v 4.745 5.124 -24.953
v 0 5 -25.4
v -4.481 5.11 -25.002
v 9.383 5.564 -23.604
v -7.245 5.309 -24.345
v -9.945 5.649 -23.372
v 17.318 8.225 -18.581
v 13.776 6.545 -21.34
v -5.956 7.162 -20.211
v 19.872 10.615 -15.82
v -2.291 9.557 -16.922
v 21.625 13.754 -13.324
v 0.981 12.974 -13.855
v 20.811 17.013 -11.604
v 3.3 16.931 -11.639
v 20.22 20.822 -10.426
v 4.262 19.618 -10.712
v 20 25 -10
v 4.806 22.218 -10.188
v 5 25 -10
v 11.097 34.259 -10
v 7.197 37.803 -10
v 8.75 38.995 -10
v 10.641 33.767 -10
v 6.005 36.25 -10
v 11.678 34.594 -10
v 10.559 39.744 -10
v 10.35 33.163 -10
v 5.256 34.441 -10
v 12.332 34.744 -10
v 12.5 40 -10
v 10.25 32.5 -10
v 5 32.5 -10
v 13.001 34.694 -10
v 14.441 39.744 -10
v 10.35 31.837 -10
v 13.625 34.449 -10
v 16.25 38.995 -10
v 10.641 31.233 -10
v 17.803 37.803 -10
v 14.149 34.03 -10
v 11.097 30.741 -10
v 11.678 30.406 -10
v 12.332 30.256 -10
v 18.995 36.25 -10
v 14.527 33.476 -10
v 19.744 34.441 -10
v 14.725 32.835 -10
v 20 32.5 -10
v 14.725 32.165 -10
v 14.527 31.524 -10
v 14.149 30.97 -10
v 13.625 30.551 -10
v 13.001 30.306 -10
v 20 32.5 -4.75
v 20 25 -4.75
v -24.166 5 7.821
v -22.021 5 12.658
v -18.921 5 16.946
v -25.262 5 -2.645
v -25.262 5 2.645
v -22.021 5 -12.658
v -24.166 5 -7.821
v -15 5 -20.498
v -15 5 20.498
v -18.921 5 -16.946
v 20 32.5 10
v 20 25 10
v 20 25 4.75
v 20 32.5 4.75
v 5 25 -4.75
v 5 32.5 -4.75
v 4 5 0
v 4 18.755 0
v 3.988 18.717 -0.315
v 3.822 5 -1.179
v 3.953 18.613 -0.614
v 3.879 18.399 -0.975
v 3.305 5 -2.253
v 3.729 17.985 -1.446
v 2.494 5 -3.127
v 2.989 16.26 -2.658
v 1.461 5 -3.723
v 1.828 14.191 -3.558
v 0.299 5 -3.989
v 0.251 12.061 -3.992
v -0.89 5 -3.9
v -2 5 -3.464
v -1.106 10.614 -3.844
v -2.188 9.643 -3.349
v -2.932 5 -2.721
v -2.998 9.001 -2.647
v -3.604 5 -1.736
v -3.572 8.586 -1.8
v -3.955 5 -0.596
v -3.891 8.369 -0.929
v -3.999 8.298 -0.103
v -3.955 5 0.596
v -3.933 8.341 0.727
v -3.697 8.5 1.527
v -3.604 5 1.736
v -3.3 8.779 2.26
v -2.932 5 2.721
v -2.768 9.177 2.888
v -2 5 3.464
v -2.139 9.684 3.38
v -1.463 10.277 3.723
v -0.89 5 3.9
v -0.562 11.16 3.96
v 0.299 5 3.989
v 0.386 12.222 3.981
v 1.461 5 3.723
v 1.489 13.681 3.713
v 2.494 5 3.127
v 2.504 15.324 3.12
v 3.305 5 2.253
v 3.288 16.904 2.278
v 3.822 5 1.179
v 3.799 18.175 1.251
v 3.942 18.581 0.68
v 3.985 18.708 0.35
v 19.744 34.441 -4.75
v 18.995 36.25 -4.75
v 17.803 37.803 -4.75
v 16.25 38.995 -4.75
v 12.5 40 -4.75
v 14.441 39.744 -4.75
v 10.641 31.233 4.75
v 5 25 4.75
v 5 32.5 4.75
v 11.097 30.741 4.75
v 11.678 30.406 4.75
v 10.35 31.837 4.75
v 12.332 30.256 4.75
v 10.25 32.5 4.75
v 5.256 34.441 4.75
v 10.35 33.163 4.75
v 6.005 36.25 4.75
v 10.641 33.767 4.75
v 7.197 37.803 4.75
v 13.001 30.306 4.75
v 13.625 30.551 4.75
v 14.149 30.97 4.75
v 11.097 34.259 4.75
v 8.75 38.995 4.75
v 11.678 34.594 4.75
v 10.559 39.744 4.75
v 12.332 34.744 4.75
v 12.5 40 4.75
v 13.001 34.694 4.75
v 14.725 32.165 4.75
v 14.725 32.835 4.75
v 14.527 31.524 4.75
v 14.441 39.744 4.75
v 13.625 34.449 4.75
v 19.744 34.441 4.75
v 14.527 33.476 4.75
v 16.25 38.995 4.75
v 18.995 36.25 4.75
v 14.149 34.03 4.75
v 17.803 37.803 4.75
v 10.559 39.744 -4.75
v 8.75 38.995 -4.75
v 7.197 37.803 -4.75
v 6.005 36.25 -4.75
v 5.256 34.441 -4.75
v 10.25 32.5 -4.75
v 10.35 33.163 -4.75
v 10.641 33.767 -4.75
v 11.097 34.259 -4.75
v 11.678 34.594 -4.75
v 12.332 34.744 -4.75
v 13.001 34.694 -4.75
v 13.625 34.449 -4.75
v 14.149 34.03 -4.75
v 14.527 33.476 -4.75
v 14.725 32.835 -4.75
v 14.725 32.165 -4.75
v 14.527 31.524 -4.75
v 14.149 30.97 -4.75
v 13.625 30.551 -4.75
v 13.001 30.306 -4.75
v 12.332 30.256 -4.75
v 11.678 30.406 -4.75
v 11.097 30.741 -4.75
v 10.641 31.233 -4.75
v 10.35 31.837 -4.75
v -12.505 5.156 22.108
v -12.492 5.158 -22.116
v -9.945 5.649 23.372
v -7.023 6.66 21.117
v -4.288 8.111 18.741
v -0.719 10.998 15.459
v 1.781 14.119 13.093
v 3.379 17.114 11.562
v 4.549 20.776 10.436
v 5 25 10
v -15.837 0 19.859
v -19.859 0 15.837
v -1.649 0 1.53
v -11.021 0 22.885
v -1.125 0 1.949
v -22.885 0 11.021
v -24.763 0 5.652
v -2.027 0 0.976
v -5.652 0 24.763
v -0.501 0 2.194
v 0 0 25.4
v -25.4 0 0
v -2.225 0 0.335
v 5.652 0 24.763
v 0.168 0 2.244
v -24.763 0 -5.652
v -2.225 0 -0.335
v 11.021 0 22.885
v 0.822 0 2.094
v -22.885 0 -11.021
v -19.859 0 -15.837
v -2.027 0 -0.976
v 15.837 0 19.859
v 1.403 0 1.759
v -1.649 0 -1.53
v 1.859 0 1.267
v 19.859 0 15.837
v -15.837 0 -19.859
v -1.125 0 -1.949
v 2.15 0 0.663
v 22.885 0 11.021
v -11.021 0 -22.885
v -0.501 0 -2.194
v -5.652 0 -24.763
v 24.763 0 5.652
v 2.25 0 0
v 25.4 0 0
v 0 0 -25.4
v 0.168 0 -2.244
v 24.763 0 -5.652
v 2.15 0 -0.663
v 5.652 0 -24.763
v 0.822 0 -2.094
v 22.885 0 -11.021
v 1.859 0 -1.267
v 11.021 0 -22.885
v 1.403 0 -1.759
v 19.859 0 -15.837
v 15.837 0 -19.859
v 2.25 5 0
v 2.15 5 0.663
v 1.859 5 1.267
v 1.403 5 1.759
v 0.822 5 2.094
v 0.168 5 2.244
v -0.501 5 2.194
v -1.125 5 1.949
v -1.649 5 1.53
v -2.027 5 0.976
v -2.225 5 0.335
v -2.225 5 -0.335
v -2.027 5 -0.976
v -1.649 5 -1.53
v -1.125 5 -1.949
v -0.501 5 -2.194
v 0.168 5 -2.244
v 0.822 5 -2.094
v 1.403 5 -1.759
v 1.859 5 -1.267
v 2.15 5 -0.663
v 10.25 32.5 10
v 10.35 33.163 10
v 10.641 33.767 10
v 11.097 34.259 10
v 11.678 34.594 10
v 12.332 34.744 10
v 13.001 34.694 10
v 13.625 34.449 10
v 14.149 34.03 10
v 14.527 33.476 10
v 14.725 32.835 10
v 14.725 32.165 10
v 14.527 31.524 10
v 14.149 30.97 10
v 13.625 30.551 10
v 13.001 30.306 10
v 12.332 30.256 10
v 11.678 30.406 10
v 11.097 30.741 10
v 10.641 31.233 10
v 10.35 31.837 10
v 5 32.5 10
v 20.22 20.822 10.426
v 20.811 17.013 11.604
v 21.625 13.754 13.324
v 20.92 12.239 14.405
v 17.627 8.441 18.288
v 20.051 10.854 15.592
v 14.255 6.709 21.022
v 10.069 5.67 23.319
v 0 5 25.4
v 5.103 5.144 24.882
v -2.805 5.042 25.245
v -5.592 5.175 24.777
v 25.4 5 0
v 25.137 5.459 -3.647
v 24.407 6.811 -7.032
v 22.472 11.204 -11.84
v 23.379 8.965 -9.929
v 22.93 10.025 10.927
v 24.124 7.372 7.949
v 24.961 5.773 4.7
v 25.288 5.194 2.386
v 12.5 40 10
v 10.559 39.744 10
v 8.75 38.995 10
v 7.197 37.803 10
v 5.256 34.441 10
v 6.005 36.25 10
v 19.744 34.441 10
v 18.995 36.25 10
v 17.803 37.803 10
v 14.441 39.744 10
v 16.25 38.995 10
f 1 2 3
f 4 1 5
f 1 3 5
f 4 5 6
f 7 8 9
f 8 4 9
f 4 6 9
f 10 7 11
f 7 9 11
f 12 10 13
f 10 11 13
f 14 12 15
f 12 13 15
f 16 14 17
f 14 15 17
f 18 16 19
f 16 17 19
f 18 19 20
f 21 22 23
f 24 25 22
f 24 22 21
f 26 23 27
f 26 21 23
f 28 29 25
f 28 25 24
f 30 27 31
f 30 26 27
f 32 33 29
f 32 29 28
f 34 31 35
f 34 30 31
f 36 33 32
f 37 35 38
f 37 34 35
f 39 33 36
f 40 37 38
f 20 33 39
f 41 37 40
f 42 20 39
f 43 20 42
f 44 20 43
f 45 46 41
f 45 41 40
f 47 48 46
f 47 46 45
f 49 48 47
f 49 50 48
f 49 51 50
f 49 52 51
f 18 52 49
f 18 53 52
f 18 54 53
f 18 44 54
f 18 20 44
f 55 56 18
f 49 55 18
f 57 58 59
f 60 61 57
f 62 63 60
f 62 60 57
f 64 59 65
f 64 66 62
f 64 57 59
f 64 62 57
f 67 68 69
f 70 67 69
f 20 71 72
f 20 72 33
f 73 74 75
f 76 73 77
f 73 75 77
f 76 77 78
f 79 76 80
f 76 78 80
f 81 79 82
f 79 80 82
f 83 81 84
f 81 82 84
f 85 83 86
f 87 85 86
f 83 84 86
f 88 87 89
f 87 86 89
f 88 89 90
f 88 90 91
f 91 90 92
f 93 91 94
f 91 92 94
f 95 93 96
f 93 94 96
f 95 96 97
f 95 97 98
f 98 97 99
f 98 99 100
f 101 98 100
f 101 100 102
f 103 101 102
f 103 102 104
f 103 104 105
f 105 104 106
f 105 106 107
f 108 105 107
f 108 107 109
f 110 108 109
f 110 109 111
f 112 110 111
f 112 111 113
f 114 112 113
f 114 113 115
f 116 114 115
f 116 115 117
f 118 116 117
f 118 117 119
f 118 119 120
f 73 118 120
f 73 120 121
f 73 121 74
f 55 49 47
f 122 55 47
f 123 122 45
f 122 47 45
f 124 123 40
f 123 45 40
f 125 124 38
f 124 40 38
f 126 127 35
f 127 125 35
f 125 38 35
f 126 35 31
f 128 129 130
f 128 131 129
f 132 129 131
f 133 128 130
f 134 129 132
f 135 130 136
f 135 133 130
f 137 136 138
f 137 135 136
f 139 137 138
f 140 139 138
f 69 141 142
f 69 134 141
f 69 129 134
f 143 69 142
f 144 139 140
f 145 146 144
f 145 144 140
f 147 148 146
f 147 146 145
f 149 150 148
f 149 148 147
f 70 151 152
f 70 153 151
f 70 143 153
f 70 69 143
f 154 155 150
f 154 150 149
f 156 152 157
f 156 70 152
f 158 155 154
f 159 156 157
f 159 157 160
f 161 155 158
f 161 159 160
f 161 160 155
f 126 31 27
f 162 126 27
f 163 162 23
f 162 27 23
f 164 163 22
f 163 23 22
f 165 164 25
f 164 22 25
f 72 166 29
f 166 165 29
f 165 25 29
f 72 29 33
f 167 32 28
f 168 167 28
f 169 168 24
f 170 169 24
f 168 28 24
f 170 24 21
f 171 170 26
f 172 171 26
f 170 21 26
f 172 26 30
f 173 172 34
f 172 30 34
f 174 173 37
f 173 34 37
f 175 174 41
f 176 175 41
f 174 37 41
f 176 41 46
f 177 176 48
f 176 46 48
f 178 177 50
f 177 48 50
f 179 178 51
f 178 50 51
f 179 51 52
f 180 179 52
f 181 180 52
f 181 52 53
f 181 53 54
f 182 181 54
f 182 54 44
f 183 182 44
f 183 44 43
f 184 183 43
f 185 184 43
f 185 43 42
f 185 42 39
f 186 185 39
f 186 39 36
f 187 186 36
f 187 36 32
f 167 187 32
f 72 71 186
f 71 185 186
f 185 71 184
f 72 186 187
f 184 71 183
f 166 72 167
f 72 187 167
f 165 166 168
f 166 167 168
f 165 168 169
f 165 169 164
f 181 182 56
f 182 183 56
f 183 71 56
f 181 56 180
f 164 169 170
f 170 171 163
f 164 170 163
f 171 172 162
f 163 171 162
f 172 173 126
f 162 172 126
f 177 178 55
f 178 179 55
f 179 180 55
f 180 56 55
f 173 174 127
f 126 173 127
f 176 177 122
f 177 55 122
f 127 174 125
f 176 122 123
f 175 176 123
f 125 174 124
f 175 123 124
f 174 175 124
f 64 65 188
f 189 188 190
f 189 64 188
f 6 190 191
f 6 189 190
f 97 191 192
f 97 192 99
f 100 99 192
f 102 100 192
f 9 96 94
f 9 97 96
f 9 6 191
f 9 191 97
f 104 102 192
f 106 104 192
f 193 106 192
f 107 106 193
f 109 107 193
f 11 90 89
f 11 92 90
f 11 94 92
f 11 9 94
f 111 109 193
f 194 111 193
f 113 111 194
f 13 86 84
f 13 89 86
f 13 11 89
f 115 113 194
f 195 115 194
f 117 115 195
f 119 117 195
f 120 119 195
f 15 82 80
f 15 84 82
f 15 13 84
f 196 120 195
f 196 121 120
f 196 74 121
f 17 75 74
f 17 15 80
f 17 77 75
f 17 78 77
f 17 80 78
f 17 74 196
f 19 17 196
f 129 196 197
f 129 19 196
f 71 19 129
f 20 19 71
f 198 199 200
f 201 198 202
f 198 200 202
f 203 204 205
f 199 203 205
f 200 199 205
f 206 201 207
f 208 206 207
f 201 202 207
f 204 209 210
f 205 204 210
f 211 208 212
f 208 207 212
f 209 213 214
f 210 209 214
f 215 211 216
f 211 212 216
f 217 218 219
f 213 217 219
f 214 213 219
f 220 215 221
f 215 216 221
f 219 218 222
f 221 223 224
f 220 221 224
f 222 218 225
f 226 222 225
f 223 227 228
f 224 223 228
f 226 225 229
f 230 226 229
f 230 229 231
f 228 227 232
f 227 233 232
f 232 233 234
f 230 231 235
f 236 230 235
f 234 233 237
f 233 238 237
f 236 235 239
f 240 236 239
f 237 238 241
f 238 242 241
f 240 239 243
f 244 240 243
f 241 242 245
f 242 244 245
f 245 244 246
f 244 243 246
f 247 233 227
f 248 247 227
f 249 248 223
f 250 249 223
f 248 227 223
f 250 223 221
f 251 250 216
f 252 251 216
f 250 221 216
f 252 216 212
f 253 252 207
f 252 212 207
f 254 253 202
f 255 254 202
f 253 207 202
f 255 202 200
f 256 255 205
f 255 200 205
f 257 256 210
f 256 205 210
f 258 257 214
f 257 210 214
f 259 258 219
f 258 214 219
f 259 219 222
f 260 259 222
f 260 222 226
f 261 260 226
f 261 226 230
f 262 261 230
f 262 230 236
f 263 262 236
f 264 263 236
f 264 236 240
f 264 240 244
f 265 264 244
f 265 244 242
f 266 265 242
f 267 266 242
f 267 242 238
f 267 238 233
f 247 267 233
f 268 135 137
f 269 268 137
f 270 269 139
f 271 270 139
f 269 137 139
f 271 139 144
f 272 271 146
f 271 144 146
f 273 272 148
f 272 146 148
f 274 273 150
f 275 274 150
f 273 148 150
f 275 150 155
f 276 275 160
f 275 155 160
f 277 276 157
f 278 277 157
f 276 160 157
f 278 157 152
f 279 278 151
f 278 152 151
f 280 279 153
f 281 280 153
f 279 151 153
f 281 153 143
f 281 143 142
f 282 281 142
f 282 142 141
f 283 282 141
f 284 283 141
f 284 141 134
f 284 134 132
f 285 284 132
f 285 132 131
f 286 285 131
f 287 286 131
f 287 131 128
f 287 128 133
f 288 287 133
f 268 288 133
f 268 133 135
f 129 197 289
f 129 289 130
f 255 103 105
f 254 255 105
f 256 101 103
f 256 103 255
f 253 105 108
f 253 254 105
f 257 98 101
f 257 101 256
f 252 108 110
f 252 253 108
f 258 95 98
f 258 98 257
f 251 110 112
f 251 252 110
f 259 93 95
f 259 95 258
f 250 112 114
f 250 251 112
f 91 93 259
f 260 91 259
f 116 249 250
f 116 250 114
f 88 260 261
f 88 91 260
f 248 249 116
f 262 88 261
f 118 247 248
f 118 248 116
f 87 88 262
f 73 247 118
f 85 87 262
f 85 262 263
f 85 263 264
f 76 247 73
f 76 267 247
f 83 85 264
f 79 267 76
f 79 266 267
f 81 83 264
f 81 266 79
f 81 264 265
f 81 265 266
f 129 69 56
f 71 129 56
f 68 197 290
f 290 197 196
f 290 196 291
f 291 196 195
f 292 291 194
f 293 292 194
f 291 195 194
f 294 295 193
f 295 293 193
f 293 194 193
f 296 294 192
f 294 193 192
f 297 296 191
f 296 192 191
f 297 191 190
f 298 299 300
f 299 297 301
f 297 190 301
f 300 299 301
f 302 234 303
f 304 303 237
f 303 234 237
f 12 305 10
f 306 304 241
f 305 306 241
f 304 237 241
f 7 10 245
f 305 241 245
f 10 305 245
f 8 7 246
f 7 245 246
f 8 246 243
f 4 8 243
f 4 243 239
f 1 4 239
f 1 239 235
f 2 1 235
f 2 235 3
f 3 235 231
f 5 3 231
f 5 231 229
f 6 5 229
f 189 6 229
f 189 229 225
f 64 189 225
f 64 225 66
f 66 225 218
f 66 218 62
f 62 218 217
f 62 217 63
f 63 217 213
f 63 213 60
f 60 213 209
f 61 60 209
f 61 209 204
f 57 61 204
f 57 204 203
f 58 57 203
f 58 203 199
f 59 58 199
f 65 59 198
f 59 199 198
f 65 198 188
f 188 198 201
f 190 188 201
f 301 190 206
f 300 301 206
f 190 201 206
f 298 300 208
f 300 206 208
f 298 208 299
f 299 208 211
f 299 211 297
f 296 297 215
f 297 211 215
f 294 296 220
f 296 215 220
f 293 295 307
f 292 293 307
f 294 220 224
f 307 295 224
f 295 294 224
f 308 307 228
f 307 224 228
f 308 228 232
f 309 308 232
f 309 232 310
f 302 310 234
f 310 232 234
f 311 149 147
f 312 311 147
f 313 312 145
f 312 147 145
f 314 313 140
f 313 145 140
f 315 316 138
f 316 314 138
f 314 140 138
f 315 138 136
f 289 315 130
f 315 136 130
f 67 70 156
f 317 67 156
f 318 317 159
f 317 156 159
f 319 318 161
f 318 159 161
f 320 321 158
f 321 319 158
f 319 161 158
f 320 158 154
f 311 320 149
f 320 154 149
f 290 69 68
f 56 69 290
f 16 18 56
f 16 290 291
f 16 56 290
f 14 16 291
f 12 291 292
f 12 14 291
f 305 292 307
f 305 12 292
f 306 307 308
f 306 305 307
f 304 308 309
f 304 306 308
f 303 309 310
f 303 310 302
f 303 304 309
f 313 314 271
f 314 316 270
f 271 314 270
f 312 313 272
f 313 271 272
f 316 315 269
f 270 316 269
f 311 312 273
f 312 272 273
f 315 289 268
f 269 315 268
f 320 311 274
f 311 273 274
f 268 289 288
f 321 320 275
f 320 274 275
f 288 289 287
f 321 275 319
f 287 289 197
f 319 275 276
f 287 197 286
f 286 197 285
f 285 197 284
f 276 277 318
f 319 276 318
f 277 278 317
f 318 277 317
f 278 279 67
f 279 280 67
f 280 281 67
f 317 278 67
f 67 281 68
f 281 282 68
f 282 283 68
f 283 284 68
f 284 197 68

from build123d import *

# Parameters (mm, degrees)
SKETCH1_R               = 25.4
BASE_DEPTH              = 25
SKETCH3_OUTSIDE_W       = 68.014
SKETCH3_OUTSIDE_H       = 42.214
CUT_EXTRUDE1_DEPTH      = 26.4
CUT_EXTRUDE1_DEPTH_BACK = 26.4
SKETCH4_OUTSIDE_W       = 68.014
SKETCH4_OUTSIDE_H       = 42.214
CUT_EXTRUDE2_DEPTH      = 26.4000001
CUT_EXTRUDE2_DEPTH_BACK = 26.4000001
SKETCH5_R               = 2.25
CUT_EXTRUDE3_DEPTH      = 26.0000001
SKETCH6_R               = 4
CUT_EXTRUDE4_DEPTH      = 20
SKETCH7_W               = 15
SKETCH7_H               = 20
ARM_BASE_DEPTH          = 15
SKETCH8_R               = 2.25
ARM_HOLE_DEPTH          = 36.4000001
SKETCH9_W               = 9.5
SKETCH9_H               = 15
CUT_EXTRUDE7_DEPTH      = 46.4000001


with BuildPart() as part:
    # Sketch1 → base (new body)
    with BuildSketch(Plane(origin=(0, 0, 0), x_dir=(1, 0, 0), z_dir=(0, 1, 0))):
        Circle(SKETCH1_R)
    extrude(amount=BASE_DEPTH)

    # Sketch3 outside → Cut-Extrude1 (cut, two sides)
    with BuildSketch(Plane.XY) as cut_extrude1_sk:
        with Locations((0, 12.5)):
            Rectangle(SKETCH3_OUTSIDE_W, SKETCH3_OUTSIDE_H)
        with BuildLine():
            Line((5, 25), (20, 25))
            ThreePointArc((20, 25), (21.373745827, 14.641911373), (25.4, 5))
            Line((25.4, 5), (25.4, 0))
            Line((25.4, 0), (-25.4, 0))
            Line((-25.4, 0), (-25.4, 5))
            Line((-25.4, 5), (-15, 5))
            ThreePointArc((-15, 5), (-0.857864376, 10.857864376), (5, 25))
        make_face(mode=Mode.SUBTRACT)
    extrude(amount=CUT_EXTRUDE1_DEPTH, mode=Mode.SUBTRACT)
    extrude(cut_extrude1_sk.sketch, amount=-CUT_EXTRUDE1_DEPTH_BACK, mode=Mode.SUBTRACT)

    # Sketch4 outside → Cut-Extrude2 (cut, two sides)
    with BuildSketch(Plane(origin=(0, 0, 0), x_dir=(0, 0, -1), z_dir=(1, 0, 0))) as cut_extrude2_sk:
        with Locations((0, 12.5)):
            Rectangle(SKETCH4_OUTSIDE_W, SKETCH4_OUTSIDE_H)
        with BuildLine():
            Line((-25.4, 5), (-25.4, 0))
            Line((-25.4, 0), (25.4, 0))
            Line((25.4, 0), (25.4, 5))
            ThreePointArc((25.4, 5), (14.296085426, 12.378985778), (10, 25))
            Line((10, 25), (-10, 25))
            ThreePointArc((-10, 25), (-14.296085426, 12.378985778), (-25.4, 5))
        make_face(mode=Mode.SUBTRACT)
    extrude(amount=CUT_EXTRUDE2_DEPTH, mode=Mode.SUBTRACT)
    extrude(cut_extrude2_sk.sketch, amount=-CUT_EXTRUDE2_DEPTH_BACK, mode=Mode.SUBTRACT)

    # Sketch5 → Cut-Extrude3 (cut, through all)
    with BuildSketch(Plane.XZ):
        Circle(SKETCH5_R)
    extrude(amount=-CUT_EXTRUDE3_DEPTH, mode=Mode.SUBTRACT)

    # Sketch6 → Cut-Extrude4 (cut)
    with BuildSketch(Plane(origin=(0, 25, 0), x_dir=(1, 0, 0), z_dir=(0, 1, 0))):
        Circle(SKETCH6_R)
    extrude(amount=-CUT_EXTRUDE4_DEPTH, mode=Mode.SUBTRACT)

    # Sketch7 → arm base (add)
    with BuildSketch(Plane(origin=(0, 25, 0), x_dir=(1, 0, 0), z_dir=(0, 1, 0))):
        with Locations((12.5, 0)):
            Rectangle(SKETCH7_W, SKETCH7_H)
    extrude(amount=ARM_BASE_DEPTH)

    # Sketch8 → arm hole (cut, through all)
    with BuildSketch(Plane(origin=(0, 0, -10), x_dir=(-1, 0, 0), z_dir=(0, 0, -1))):
        with BuildLine():
            ThreePointArc((-12.5, 40), (-7.196699141, 37.803300859), (-5, 32.5))
            Line((-5, 32.5), (-5, 40))
            Line((-5, 40), (-12.5, 40))
        make_face()
        with BuildLine():
            ThreePointArc((-20, 32.5), (-17.803300859, 37.803300859), (-12.5, 40))
            Line((-12.5, 40), (-20, 40))
            Line((-20, 40), (-20, 32.5))
        make_face()
        with Locations((-12.5, 32.5)):
            Circle(SKETCH8_R)
    extrude(amount=-ARM_HOLE_DEPTH, mode=Mode.SUBTRACT)

    # Sketch9 → Cut-Extrude7 (cut, through all)
    with BuildSketch(Plane(origin=(20, 0, 0), x_dir=(0, 0, -1), z_dir=(1, 0, 0))):
        with Locations((0, 32.5)):
            Rectangle(SKETCH9_W, SKETCH9_H)
    extrude(amount=-CUT_EXTRUDE7_DEPTH, mode=Mode.SUBTRACT)


solid = part.part
